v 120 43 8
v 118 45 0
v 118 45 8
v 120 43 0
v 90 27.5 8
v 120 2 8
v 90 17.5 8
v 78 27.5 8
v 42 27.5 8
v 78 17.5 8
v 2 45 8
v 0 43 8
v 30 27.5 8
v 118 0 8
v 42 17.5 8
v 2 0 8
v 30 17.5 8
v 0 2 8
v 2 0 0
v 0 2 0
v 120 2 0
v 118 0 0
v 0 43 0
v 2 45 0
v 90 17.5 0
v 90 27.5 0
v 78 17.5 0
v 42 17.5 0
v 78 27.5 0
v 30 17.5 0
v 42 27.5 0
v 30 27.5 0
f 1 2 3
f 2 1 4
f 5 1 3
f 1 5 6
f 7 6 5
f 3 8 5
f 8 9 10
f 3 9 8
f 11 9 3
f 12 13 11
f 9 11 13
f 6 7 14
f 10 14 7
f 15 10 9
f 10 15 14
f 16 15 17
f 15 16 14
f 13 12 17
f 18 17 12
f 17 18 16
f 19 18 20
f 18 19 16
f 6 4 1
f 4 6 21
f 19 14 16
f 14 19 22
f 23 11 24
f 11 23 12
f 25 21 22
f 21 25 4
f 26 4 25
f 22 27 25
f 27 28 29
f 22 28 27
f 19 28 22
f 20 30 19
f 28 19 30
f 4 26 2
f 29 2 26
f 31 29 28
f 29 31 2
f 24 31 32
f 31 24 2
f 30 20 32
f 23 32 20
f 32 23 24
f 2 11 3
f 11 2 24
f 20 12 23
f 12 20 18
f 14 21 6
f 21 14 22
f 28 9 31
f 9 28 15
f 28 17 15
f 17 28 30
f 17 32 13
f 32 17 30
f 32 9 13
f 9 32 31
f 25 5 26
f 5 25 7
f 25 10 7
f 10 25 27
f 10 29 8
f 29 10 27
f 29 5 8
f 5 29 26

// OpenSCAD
$fn = 32;

// ----------------------------------------------------------------------
// Windowed plate: 2 voids, 120 x 45 x 8 mm
// ----------------------------------------------------------------------

// --- parameters (mm) ---
plate_l = 120;            // plate length, X
plate_w = 45;             // plate width, Y
plate_t = 8;              // plate thickness, Z
edge_margin = 12;         // wall from the plate edge to any window
windows = 2;              // number of windows in the row
win_l = 12;               // window length
win_w = 10;               // window width
win_pitch = 48;           // window pitch along X
depth_1 = 8;              // depth of void 1 (full thickness = through)
depth_2 = 8;              // depth of void 2 (full thickness = through)
corner_c = 2;             // corner chamfer of the plate

profile = [[2, 0], [118, 0], [120, 2], [120, 43], [118, 45], [2, 45], [0, 43], [0, 2]];  // primary outline, 8 points, counter clockwise
void_1 = [[30, 17.5], [42, 17.5], [42, 27.5], [30, 27.5]];  // window 1 of the row, 4 points
void_2 = [[78, 17.5], [90, 17.5], [90, 27.5], [78, 27.5]];  // window 2 of the row, 4 points

// --- the one profile operation ---
difference() {
  linear_extrude(height = plate_t) polygon(points = profile);
  translate([0, 0, -1])
    linear_extrude(height = plate_t + 2) polygon(points = void_1);
  translate([0, 0, -1])
    linear_extrude(height = plate_t + 2) polygon(points = void_2);
}
